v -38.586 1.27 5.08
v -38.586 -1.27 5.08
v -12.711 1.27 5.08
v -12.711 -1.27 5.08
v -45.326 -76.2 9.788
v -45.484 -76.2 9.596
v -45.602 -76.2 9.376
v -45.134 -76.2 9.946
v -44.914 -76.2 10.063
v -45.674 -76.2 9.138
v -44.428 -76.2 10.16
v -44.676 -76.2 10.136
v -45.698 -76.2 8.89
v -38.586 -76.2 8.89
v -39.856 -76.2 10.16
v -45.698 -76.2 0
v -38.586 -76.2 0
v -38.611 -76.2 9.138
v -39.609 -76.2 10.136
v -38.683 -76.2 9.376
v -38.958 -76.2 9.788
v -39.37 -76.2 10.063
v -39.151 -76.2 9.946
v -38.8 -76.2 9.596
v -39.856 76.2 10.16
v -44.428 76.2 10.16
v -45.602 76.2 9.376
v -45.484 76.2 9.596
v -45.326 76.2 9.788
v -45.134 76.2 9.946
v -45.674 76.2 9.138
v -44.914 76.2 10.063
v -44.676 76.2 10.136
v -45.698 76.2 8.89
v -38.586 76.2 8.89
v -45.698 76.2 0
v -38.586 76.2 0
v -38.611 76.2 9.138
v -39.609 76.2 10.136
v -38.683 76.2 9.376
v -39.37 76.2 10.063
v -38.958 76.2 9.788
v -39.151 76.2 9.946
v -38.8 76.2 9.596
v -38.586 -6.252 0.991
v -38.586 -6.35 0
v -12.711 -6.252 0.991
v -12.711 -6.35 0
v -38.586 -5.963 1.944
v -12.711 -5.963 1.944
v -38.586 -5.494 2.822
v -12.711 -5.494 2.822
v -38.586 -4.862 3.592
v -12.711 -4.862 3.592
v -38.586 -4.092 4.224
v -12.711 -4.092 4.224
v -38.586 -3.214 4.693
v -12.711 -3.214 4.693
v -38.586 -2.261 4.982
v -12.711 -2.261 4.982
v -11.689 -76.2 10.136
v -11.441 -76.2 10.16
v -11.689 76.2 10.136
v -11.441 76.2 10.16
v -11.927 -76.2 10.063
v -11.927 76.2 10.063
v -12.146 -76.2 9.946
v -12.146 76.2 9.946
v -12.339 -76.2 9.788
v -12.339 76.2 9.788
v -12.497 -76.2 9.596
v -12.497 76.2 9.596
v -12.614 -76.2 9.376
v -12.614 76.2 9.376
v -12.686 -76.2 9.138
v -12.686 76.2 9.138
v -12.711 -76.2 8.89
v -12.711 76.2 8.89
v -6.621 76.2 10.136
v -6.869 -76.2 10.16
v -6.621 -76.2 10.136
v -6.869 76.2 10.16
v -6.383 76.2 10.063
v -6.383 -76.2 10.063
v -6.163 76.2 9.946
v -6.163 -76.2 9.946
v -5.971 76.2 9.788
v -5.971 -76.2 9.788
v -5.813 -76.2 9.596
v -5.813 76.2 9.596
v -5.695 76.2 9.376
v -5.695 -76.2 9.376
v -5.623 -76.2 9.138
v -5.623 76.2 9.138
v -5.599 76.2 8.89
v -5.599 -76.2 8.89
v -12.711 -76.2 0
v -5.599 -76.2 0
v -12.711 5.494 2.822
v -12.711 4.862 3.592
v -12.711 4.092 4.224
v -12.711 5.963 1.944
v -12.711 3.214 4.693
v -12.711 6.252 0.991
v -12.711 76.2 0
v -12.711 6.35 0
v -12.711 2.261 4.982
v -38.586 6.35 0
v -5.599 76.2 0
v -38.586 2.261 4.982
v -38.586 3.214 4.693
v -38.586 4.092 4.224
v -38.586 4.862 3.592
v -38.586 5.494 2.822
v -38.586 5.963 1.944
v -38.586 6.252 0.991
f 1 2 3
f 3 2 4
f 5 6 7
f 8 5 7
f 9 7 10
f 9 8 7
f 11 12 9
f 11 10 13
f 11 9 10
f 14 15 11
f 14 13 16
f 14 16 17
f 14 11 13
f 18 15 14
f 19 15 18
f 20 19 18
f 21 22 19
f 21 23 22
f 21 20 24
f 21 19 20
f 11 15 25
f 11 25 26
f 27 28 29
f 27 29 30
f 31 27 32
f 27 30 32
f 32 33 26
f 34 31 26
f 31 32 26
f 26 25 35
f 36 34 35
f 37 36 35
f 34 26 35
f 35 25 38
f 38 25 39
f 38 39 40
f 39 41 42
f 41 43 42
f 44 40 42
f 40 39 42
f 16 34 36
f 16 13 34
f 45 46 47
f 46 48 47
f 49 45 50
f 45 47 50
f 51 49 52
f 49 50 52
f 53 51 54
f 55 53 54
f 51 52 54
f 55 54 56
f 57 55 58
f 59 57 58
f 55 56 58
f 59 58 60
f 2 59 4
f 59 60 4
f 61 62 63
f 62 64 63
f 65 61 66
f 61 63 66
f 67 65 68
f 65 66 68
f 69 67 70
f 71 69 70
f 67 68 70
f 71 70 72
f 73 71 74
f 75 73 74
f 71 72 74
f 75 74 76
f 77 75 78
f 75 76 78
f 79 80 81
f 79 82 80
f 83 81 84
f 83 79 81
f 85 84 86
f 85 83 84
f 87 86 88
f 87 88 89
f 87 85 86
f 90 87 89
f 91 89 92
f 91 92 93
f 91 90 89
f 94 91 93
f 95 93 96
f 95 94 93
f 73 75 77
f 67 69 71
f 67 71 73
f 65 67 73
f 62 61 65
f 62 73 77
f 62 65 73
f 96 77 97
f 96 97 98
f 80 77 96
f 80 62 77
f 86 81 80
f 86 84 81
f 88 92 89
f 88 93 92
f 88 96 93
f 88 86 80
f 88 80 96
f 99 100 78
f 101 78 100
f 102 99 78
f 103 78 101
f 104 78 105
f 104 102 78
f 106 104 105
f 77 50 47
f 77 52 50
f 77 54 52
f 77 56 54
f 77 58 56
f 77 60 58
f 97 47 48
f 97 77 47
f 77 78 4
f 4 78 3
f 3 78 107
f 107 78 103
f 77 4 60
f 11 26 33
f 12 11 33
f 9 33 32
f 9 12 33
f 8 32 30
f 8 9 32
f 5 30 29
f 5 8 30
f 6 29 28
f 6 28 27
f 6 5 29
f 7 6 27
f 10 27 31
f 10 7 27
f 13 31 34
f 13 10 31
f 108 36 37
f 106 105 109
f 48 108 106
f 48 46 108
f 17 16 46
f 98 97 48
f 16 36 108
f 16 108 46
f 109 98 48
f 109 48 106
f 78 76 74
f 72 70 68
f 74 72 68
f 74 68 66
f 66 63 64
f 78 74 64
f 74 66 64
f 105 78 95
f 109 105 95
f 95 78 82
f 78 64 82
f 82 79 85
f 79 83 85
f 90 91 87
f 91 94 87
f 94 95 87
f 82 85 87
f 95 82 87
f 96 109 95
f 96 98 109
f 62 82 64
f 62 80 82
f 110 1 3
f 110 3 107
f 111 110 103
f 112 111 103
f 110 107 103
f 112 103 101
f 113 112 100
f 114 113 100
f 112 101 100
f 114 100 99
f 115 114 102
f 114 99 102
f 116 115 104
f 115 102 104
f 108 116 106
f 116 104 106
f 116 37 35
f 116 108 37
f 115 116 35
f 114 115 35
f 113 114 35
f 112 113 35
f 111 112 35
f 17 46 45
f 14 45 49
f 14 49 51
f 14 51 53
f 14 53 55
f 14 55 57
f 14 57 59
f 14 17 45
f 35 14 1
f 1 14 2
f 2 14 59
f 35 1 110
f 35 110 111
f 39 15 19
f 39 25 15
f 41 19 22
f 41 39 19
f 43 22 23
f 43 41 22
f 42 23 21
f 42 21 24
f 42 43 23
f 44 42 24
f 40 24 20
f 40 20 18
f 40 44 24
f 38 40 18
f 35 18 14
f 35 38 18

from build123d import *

# Parameters (mm, degrees)
F1_DEPTH = 76.2
F0_W     = 25.8755748077
F0_H     = 5.08
F2_DEPTH = 6.35
F3_R     = 1.27
F4_R     = 5.07999


# Not quite as in the source:
# - two fillets or chamfers of one size are made in one step
# - a fillet or chamfer is up to 0.001 mm smaller than in the source, because OpenCascade refuses the exact size


with BuildPart() as f1:
    # F0 (on Front) → F1 (new body, symmetric)
    with BuildSketch(Plane.XZ):
        Polygon((-38.5863832052, 10.16), (-45.6983832052, 10.16), (-45.6983832052, 0), (-38.5863832052, 0), (-38.5863832052, 5.08), align=None)
    extrude(amount=F1_DEPTH, both=True)



with BuildPart() as f1b:
    # F0 (on Front) → F1, piece 2 (new body, symmetric)
    with BuildSketch(Plane.XZ):
        Polygon((-12.7108083974, 10.16), (-12.7108083974, 5.08), (-12.7108083974, 0), (-5.5988083974, 0), (-5.5988083974, 10.16), align=None)
    extrude(amount=F1_DEPTH, both=True)


with BuildPart() as f1_1:
    add(f1.part)

    add(f1b.part)  # F2 merges F1b
    # F0 (on Front) → F2 (join, symmetric)
    with BuildSketch(Plane.XZ):
        Polygon((-38.5863832052, 10.16), (-45.6983832052, 10.16), (-45.6983832052, 0), (-38.5863832052, 0), (-38.5863832052, 5.08), align=None)
        with Locations((-25.6485958013, 2.54)):
            Rectangle(F0_W, F0_H)
        Polygon((-12.7108083974, 10.16), (-12.7108083974, 5.08), (-12.7108083974, 0), (-5.5988083974, 0), (-5.5988083974, 10.16), align=None)
    extrude(amount=F2_DEPTH, both=True)

    # F3
    f3_edges = [f1_1.edges().sort_by_distance(p)[0] for p in [
        (-45.698383, 0, 10.16),
        (-38.586383, 0, 10.16),
        (-12.710808, 0, 10.16),
        (-5.598808, 0, 10.16),
    ]]
    fillet(f3_edges, radius=F3_R)

    # F4 (radius 5.08 in the source; OpenCascade refuses exactly that, so slightly less here)
    f4_edges = [f1_1.edges().sort_by_distance(p)[0] for p in [
        (-25.648596, 6.35, 5.08),
        (-25.648596, -6.35, 5.08),
    ]]
    fillet(f4_edges, radius=F4_R)


solid = f1_1.part
